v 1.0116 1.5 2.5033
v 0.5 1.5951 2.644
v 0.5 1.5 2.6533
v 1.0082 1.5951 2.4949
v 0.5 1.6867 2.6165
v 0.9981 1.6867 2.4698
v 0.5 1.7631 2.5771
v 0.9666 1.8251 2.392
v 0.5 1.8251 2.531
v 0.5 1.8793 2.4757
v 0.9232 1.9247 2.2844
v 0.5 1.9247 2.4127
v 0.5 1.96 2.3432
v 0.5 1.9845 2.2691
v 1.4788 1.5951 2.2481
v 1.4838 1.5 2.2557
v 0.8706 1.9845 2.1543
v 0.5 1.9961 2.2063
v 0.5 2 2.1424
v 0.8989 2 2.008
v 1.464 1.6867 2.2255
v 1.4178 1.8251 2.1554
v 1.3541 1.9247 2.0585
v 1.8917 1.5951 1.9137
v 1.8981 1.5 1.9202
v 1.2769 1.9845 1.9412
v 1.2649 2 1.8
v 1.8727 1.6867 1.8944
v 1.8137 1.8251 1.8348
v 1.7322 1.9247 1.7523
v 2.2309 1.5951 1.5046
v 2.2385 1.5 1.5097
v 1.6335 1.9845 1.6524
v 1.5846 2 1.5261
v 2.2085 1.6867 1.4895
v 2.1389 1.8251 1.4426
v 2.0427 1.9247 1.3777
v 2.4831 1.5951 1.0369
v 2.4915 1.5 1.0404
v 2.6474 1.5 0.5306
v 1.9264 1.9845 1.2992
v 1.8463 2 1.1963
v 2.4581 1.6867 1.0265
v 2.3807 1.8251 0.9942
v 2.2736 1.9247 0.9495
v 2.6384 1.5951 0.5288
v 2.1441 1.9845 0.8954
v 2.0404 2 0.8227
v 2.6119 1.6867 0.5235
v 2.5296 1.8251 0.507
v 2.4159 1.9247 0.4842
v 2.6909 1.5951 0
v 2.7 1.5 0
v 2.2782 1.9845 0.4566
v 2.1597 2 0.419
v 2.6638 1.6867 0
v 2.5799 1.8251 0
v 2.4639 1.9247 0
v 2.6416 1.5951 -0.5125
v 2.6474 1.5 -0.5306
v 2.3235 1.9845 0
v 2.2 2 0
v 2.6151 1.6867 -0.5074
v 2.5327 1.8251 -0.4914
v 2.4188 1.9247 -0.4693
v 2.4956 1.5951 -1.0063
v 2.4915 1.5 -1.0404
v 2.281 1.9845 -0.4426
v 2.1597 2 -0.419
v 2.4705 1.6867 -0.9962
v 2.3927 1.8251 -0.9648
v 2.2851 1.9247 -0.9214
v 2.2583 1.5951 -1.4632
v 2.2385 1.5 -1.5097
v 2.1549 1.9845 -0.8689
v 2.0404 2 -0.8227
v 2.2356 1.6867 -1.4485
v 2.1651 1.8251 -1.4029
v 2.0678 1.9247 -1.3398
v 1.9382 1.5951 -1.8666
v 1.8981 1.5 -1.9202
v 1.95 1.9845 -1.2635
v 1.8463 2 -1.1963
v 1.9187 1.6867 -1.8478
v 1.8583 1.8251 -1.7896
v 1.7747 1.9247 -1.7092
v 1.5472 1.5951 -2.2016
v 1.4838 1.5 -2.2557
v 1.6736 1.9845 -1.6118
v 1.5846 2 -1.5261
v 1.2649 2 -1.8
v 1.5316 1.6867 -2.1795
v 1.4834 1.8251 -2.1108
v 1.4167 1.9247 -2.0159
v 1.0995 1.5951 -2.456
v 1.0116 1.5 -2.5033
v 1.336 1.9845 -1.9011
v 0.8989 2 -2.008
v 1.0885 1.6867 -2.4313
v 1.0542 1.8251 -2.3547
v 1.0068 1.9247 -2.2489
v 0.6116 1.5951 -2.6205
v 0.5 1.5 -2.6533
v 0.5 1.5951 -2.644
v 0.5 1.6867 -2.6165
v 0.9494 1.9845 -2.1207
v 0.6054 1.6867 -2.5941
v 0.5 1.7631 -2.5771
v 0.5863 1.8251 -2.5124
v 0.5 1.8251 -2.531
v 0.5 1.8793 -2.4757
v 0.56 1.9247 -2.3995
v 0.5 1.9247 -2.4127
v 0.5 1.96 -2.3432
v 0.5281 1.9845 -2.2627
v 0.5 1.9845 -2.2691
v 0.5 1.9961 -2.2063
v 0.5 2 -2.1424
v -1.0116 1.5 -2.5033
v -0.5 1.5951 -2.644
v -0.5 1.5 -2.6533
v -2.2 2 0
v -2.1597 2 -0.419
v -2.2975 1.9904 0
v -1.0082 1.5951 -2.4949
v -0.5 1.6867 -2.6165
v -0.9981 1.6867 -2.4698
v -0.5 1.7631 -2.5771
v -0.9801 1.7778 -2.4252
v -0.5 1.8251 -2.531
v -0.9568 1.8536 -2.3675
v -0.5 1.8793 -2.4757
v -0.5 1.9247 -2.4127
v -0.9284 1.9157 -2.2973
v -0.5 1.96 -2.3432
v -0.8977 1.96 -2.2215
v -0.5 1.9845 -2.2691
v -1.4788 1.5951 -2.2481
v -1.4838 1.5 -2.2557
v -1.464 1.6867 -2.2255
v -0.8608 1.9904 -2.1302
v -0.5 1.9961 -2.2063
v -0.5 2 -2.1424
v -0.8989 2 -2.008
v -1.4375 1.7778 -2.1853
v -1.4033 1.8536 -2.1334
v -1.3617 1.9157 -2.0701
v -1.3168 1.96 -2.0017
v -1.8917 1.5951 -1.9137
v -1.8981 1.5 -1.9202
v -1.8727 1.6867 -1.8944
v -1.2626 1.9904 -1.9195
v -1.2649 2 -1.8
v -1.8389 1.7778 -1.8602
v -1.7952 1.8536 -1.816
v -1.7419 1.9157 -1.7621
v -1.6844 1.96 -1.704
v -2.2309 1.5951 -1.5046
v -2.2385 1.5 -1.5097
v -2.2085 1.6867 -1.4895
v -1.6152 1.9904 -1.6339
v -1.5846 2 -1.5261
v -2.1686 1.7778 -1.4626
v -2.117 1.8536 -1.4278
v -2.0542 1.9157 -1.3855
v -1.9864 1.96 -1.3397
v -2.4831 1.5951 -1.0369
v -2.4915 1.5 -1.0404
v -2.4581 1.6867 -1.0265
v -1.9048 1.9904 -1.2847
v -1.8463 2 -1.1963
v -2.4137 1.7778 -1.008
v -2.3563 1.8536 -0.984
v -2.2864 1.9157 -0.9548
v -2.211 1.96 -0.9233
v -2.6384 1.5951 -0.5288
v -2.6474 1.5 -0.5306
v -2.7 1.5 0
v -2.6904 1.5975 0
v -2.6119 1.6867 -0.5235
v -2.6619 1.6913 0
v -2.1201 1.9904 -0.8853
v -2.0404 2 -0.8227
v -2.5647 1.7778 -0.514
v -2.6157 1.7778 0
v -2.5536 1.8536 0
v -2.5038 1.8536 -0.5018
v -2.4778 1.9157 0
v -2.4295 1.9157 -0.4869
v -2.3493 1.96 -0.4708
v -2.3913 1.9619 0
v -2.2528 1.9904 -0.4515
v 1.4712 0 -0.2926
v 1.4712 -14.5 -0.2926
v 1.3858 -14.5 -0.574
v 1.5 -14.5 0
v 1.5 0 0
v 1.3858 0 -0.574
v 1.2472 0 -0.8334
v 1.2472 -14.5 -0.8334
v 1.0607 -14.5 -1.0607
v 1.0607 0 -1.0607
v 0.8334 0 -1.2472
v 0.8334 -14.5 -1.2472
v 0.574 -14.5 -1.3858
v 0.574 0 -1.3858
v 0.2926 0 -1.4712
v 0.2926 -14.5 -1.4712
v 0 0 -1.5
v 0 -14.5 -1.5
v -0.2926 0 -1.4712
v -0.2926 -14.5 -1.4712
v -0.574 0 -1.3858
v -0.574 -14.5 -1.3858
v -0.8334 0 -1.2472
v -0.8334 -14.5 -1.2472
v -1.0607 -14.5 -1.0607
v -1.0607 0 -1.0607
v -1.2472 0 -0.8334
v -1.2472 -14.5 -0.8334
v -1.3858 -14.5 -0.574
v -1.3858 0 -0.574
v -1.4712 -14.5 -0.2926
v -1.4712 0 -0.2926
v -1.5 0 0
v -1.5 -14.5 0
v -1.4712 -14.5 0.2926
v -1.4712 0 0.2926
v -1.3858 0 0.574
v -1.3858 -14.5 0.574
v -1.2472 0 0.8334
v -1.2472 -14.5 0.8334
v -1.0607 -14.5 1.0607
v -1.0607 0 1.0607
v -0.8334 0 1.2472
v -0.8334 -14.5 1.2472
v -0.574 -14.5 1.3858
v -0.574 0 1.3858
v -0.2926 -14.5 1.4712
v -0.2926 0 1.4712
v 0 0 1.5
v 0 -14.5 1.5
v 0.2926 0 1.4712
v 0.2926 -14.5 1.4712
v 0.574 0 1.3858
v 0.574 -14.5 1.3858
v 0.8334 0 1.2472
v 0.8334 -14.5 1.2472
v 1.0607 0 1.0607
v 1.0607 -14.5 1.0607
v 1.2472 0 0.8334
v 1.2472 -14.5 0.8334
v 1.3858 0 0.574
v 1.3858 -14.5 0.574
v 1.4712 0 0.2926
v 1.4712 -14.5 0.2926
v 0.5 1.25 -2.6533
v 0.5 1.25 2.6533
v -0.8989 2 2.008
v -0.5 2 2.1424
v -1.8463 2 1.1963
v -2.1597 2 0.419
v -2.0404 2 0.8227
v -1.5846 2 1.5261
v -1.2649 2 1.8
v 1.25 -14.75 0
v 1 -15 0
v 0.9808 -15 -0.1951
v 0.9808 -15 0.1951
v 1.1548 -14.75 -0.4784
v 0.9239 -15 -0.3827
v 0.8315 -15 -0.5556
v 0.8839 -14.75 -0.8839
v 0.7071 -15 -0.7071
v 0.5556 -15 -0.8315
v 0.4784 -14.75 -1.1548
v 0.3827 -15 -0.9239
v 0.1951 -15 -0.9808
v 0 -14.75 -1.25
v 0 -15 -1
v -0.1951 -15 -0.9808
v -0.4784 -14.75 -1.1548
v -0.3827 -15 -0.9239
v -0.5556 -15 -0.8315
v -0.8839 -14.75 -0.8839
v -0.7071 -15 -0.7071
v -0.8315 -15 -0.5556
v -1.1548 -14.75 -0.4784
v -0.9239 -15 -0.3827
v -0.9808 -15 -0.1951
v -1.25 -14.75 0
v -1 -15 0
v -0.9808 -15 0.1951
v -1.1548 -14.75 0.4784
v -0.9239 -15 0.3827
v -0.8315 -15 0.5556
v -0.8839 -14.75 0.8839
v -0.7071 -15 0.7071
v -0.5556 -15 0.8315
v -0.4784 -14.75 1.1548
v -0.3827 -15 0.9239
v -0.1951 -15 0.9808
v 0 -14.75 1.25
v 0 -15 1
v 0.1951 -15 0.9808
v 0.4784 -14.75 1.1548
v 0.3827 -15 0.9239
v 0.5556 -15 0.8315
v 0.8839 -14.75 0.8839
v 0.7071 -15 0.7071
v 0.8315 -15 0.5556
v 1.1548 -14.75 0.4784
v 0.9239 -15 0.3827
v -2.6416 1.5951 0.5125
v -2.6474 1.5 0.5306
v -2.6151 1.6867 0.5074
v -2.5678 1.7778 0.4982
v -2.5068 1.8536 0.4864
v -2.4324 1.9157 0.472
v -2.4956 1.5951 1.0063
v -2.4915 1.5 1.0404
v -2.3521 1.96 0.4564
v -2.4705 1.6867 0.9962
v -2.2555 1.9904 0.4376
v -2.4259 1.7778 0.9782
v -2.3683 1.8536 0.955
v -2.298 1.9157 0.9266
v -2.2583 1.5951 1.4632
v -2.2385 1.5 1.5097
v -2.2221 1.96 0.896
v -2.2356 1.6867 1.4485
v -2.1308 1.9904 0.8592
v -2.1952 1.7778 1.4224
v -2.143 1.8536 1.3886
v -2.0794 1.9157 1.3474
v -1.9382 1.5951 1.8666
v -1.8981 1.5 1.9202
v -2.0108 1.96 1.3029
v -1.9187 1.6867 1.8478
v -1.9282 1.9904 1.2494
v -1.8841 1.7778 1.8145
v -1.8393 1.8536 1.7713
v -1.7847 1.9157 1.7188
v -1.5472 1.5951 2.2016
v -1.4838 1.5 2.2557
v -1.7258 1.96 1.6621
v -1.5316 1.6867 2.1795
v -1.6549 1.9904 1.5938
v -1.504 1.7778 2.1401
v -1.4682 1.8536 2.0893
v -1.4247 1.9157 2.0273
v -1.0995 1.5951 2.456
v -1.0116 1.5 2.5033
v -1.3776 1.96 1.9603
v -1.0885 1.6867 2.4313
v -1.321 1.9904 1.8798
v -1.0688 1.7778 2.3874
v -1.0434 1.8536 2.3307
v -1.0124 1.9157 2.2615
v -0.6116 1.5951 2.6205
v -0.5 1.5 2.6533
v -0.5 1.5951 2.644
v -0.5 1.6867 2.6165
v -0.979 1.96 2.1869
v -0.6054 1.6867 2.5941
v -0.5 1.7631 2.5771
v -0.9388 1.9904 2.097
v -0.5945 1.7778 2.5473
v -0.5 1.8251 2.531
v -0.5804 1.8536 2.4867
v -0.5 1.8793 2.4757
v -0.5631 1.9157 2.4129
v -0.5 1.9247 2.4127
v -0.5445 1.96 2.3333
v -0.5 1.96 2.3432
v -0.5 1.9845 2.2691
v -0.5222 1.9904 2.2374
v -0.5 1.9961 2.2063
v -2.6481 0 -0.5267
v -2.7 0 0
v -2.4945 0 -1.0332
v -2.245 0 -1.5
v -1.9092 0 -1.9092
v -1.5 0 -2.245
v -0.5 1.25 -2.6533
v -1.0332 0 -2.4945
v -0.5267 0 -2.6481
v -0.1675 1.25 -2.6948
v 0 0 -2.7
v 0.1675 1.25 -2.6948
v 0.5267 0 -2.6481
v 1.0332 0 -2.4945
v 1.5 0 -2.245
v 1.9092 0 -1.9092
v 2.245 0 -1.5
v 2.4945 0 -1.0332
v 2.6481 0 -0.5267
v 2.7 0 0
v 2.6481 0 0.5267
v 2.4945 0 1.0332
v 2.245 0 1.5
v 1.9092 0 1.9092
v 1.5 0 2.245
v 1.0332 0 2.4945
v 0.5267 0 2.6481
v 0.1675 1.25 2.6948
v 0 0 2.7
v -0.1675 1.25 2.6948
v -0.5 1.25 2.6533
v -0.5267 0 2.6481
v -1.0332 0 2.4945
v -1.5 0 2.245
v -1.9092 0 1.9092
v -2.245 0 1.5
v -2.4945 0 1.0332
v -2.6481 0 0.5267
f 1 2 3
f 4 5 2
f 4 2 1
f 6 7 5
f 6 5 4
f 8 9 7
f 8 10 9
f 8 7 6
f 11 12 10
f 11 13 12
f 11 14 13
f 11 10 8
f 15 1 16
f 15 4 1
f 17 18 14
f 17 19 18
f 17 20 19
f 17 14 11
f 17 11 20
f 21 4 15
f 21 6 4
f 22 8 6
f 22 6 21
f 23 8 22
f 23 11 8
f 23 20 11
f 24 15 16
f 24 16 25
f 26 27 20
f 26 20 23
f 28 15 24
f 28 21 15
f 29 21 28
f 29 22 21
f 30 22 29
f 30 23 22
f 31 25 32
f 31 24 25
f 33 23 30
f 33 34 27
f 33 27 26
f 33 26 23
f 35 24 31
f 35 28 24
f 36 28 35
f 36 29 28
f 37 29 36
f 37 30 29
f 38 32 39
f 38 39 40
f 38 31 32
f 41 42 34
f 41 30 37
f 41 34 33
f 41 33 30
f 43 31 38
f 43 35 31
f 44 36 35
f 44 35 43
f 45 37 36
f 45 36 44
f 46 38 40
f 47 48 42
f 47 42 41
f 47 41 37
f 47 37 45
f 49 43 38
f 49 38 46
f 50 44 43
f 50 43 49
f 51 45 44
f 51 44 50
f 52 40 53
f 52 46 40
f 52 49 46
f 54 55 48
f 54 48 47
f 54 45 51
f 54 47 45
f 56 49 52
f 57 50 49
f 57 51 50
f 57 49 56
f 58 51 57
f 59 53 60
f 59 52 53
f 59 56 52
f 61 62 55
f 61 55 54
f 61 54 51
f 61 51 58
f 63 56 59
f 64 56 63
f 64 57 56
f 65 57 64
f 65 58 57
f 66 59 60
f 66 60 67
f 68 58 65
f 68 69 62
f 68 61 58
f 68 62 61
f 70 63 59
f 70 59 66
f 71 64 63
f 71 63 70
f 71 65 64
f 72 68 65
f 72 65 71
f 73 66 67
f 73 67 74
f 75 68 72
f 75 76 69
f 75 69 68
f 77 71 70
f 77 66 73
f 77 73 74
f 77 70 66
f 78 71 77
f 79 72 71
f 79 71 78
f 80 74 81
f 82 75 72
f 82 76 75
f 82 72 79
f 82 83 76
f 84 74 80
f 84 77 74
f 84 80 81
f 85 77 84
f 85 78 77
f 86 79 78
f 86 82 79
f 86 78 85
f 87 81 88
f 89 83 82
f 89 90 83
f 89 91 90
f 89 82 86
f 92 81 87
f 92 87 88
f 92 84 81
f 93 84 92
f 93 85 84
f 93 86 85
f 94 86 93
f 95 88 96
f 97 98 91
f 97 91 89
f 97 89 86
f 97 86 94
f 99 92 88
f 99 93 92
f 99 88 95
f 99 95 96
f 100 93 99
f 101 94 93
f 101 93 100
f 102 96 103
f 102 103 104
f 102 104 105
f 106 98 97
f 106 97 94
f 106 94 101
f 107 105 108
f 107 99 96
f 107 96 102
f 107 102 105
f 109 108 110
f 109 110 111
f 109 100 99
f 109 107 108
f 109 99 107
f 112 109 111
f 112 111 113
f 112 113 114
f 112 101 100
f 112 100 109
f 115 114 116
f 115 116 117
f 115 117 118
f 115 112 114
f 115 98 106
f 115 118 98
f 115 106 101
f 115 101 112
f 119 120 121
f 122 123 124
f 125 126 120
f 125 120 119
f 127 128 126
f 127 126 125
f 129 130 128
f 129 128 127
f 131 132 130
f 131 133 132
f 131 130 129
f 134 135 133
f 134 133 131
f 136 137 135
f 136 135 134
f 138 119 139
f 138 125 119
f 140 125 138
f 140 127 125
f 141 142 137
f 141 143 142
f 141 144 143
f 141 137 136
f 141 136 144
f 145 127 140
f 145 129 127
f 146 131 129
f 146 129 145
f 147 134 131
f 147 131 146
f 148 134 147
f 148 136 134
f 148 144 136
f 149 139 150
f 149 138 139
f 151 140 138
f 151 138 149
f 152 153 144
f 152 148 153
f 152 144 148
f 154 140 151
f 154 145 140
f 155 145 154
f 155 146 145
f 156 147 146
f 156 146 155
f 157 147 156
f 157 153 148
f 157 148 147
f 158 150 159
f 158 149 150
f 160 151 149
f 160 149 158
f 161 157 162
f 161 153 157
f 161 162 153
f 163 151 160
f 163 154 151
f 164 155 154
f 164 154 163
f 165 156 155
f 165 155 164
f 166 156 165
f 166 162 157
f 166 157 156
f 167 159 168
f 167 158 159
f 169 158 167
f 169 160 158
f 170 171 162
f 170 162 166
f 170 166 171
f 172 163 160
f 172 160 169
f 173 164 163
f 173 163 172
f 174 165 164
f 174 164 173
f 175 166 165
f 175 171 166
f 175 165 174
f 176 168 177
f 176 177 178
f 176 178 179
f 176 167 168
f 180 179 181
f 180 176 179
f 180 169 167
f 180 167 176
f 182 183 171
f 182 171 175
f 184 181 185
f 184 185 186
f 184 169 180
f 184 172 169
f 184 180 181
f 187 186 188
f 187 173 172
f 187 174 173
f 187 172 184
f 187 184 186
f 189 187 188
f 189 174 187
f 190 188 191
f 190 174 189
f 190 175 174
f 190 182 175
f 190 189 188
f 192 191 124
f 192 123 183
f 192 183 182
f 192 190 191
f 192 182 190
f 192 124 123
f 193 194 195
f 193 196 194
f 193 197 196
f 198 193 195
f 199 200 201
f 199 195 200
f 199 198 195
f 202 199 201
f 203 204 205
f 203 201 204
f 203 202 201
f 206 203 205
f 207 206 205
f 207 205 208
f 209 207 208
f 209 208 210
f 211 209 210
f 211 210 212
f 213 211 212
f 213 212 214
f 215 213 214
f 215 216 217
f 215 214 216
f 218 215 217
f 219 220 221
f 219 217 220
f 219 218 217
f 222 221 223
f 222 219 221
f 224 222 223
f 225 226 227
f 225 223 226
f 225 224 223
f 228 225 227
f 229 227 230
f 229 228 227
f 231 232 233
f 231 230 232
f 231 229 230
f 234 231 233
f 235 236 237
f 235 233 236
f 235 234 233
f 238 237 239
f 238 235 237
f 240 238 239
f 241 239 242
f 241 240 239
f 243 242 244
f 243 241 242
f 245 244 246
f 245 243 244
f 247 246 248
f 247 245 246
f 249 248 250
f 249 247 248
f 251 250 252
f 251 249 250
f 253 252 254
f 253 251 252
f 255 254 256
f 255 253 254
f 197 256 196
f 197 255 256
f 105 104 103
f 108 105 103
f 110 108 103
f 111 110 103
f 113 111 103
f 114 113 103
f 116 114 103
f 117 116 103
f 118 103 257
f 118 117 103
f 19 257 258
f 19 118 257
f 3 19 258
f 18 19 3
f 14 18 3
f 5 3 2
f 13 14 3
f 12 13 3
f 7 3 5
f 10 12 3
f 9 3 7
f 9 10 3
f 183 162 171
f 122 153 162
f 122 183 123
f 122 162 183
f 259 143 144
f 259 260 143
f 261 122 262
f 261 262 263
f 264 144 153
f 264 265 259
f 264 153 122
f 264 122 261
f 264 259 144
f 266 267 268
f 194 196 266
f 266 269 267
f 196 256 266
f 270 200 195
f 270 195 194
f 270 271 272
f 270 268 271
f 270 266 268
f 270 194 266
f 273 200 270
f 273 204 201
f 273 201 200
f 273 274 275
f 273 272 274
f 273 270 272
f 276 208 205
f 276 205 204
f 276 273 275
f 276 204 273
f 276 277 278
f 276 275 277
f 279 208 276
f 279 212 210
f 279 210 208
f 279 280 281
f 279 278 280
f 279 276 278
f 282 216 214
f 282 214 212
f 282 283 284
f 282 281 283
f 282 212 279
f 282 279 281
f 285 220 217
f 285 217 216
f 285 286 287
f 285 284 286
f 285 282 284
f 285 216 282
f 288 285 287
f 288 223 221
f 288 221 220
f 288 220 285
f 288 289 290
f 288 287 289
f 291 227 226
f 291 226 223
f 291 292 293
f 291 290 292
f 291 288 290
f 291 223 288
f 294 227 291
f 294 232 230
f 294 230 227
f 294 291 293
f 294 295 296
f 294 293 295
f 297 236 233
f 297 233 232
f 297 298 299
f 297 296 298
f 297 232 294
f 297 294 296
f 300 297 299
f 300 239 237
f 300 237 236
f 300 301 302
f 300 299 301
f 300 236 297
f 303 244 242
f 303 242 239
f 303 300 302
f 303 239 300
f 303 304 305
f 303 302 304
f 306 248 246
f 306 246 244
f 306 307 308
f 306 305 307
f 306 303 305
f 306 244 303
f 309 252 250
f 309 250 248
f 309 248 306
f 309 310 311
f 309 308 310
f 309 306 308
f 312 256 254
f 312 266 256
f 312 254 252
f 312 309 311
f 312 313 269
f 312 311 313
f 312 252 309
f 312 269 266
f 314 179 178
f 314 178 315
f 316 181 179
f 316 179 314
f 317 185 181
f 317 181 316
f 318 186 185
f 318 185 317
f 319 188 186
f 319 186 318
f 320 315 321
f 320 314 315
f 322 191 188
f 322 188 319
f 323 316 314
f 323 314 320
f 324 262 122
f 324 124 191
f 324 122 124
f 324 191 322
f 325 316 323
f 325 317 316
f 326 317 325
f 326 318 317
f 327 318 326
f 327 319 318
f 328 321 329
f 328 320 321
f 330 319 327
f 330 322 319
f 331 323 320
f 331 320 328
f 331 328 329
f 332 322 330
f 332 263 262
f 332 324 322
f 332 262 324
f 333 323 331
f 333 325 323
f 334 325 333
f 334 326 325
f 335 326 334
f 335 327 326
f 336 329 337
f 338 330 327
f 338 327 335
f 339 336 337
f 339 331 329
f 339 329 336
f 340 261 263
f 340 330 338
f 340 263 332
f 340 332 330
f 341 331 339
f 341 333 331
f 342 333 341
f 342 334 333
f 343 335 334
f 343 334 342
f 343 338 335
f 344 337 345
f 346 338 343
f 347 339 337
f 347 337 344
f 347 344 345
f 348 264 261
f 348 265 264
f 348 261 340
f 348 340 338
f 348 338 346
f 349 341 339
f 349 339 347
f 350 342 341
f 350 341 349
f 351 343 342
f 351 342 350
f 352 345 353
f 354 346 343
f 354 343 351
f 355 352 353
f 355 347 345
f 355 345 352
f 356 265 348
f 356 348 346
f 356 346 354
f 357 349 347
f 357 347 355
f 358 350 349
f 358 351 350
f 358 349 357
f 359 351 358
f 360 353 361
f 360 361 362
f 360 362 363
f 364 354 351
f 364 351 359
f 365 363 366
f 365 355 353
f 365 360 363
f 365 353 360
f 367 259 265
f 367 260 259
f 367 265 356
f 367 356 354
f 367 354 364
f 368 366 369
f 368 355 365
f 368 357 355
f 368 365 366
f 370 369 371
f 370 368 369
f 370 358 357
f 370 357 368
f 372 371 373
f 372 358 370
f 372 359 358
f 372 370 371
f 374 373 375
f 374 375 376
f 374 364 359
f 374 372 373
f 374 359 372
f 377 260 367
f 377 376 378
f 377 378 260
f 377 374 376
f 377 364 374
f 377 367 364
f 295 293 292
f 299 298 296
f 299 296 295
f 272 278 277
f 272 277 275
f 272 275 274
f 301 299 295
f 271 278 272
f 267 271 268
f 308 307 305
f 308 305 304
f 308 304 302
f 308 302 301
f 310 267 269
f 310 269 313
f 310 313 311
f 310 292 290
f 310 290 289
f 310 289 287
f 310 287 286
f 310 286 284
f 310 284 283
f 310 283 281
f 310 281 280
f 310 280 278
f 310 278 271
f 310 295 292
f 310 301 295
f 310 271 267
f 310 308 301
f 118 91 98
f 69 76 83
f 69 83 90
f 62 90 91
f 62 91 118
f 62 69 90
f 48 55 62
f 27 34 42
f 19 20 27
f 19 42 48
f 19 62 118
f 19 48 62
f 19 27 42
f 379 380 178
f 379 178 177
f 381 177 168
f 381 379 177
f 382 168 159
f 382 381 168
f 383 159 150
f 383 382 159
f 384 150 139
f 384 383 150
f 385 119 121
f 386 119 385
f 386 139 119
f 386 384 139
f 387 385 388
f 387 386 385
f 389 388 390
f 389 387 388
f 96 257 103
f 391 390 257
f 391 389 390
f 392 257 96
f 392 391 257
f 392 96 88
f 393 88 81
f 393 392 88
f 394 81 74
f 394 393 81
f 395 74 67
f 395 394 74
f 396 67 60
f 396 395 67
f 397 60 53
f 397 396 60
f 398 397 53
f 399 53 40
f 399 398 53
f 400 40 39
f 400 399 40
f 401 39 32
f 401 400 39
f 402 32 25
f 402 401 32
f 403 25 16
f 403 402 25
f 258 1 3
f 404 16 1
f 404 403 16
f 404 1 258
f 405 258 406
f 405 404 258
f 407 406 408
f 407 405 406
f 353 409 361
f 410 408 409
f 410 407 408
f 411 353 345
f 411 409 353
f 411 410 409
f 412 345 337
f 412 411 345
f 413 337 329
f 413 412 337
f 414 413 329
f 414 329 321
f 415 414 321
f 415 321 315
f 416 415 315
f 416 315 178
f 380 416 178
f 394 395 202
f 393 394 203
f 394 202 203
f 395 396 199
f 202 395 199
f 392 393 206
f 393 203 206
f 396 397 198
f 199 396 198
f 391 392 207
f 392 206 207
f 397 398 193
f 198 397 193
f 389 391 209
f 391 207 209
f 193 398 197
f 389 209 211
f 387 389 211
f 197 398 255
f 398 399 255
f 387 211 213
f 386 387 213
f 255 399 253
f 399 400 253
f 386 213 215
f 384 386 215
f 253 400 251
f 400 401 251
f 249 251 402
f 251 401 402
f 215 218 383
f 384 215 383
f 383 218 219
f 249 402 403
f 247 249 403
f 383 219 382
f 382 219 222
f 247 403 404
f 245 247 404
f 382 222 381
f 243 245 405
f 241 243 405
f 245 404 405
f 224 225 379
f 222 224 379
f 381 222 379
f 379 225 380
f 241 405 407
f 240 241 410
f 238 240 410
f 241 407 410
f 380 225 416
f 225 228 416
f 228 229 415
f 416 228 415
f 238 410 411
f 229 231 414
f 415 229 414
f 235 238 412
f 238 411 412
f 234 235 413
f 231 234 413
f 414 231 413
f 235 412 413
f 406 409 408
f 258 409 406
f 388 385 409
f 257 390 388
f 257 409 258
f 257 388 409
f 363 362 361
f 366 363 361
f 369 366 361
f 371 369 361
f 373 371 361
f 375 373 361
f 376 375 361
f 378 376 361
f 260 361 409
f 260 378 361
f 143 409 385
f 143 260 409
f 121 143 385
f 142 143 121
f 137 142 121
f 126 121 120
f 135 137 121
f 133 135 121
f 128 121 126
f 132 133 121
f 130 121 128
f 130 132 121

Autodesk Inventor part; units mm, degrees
ref_plane "YZ Plane" through (0, 0, 0) normal (1, 0, 0) x (0, 1, 0)
ref_plane "XZ Plane" through (0, 0, 0) normal (0, 1, 0) x (-1, 0, 0)
ref_plane "XY Plane" through (0, 0, 0) normal (0, 0, 1) x (1, 0, 0)
sketch "Sketch1" plane through (0, 0, 0) normal (0, 1, 0) x (-1, 0, 0)
  circle A0 centre (0, 0) radius 2.7
  dimension "headDiameter" = 5.4
extrude "Extrusion1" add sketch "Sketch1" along normal blind 2
sketch "Sketch2" plane through (0, 2, 0) normal (0, 1, 0) x (1, 0, 0)
  line L0 (0.5, -2.7) -> (-0.5, -2.7)
  line L1 (-0.5, -2.7) -> (-0.5, 2.7)
  line L2 (-0.5, 2.7) -> (0.5, 2.7)
  line L3 (0.5, 2.7) -> (0.5, -2.7)
  line L4 (0.5, -2.7) -> (-0.5, 2.7) construction
  line L5 (-0.5, -2.7) -> (0.5, 2.7) construction
  point P0 (0, 0)
  dimension "d3" = 1
  dimension "d4" = 5.4
extrude "Extrusion2" cut sketch "Sketch2" against normal blind 0.75
sketch "Sketch3" plane through (0, 0, 0) normal (0, -1, 0) x (1, 0, 0)
  circle A0 centre (0, 0) radius 1.5
  dimension "d7" = 3
extrude "Extrusion3" add sketch "Sketch3" along normal blind 15
chamfer "Chamfer1" distance 0.5 angle 45 1 edges at (-1.5, -15, 0)
fillet "Fillet1" radius 0.5 3 edges at (-2.0785, 2, 1.7234) (-2.0785, 2, -1.7234) (2.7, 2, 0)
equation "\"d4\" = headDiameter"
properties part number "machineScrew3x15" material "Stainless Steel"
